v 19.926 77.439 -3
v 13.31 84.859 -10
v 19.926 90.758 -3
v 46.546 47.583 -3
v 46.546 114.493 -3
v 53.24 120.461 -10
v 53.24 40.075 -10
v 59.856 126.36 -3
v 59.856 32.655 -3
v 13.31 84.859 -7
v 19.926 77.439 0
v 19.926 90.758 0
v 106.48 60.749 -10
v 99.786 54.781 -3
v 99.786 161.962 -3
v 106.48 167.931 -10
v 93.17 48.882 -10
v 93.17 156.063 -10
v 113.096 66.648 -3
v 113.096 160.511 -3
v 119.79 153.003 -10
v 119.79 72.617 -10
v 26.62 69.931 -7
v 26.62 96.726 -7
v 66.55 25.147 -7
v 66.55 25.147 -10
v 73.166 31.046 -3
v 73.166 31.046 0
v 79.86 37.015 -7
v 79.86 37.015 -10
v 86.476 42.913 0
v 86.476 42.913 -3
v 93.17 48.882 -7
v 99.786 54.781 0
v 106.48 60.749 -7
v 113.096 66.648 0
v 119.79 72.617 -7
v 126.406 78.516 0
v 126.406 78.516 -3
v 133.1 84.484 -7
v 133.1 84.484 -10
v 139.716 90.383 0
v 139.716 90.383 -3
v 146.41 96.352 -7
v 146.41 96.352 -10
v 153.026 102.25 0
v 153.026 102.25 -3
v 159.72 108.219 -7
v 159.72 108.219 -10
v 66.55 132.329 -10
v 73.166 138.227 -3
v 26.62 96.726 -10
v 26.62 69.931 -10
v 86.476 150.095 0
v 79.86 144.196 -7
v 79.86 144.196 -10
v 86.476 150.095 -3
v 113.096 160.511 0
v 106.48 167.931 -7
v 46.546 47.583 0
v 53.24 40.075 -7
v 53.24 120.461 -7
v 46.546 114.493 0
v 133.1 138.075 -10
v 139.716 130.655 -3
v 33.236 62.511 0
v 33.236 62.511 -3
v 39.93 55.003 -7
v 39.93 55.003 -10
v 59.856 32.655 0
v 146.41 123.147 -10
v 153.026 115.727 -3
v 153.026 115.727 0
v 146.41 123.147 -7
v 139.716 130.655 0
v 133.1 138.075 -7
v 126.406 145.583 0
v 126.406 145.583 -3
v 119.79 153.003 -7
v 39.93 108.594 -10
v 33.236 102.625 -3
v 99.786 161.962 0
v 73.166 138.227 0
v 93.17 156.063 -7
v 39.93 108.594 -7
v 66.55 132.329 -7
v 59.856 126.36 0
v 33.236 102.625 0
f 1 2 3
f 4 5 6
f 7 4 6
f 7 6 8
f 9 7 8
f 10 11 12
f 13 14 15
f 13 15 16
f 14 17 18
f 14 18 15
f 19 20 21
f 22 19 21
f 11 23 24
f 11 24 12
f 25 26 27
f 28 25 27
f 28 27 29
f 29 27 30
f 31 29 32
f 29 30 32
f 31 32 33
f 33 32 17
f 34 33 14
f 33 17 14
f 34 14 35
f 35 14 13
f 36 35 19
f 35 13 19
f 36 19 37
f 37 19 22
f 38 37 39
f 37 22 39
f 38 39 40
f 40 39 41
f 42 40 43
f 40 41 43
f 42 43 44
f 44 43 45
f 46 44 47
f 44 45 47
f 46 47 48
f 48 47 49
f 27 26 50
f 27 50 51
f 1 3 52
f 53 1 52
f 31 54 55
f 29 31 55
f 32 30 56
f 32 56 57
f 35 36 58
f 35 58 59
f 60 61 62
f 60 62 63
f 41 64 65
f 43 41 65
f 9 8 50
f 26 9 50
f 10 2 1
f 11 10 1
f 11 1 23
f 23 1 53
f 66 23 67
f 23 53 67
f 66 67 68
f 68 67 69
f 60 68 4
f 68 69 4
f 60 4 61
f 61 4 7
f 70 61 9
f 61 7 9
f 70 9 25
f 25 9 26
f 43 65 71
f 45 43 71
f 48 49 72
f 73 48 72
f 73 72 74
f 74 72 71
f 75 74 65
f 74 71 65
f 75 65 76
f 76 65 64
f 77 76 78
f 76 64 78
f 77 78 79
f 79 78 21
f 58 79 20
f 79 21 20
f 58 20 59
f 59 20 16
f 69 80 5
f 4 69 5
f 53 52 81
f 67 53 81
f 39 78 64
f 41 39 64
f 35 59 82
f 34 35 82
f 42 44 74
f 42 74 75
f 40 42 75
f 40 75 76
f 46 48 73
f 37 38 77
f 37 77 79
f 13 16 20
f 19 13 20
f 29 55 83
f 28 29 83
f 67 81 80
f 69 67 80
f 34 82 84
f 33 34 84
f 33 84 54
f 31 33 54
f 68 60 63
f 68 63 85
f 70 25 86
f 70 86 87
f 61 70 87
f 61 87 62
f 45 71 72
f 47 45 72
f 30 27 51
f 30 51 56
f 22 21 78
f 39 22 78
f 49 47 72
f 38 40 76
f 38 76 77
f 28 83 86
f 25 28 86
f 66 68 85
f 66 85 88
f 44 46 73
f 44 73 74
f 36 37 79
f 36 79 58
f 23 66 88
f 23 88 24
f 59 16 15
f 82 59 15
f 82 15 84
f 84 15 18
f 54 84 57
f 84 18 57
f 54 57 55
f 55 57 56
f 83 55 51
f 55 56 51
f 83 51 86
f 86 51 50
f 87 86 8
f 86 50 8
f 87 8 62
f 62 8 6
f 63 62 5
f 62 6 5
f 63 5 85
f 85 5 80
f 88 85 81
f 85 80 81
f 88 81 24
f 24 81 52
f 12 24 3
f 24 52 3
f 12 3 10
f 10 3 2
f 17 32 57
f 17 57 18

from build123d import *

# Parameters (mm, degrees)
BOSS_EXTRU_1_DEPTH         = 200
R_P_TITION_LIN_AIRE1_COUNT = 15
R_P_TITION_LIN_AIRE1_PITCH = 13.31
ESQUISSE4_OUTSIDE_W        = 258.204
ESQUISSE4_OUTSIDE_H        = 258.554
ENL_V_MAT_EXTRU_2_DEPTH    = 150


with BuildPart() as part:
    # Esquisse1 → Boss.-Extru.1 (new body)
    with BuildSketch(Plane(origin=(0, 0, 0), x_dir=(1, 0, 0), z_dir=(0, 1, 0))):
        Polygon((0, 10), (6.615825808, 3), (6.615825808, 0), (0, 7), (-6.694174192, 0), (-6.694174192, 3), align=None)
    boss_extru_1 = extrude(amount=BOSS_EXTRU_1_DEPTH)

    # Répétition linéaire1: Boss.-Extru.1 ×15
    with Locations(*[(i * R_P_TITION_LIN_AIRE1_PITCH, 0, 0) for i in range(1, R_P_TITION_LIN_AIRE1_COUNT)]):
        add(boss_extru_1)

    # Esquisse4 outside → Enlèv. mat.-Extru.2 (cut)
    with BuildSketch(Plane.XY.offset(-10)):
        with Locations((93.131, 100)):
            Rectangle(ESQUISSE4_OUTSIDE_W, ESQUISSE4_OUTSIDE_H)
        Polygon((66.55, 25.147148524), (159.72, 108.218978148), (106.48, 167.930806122), (13.31, 84.858976498), align=None, mode=Mode.SUBTRACT)
    extrude(amount=ENL_V_MAT_EXTRU_2_DEPTH, mode=Mode.SUBTRACT)


solid = part.part
